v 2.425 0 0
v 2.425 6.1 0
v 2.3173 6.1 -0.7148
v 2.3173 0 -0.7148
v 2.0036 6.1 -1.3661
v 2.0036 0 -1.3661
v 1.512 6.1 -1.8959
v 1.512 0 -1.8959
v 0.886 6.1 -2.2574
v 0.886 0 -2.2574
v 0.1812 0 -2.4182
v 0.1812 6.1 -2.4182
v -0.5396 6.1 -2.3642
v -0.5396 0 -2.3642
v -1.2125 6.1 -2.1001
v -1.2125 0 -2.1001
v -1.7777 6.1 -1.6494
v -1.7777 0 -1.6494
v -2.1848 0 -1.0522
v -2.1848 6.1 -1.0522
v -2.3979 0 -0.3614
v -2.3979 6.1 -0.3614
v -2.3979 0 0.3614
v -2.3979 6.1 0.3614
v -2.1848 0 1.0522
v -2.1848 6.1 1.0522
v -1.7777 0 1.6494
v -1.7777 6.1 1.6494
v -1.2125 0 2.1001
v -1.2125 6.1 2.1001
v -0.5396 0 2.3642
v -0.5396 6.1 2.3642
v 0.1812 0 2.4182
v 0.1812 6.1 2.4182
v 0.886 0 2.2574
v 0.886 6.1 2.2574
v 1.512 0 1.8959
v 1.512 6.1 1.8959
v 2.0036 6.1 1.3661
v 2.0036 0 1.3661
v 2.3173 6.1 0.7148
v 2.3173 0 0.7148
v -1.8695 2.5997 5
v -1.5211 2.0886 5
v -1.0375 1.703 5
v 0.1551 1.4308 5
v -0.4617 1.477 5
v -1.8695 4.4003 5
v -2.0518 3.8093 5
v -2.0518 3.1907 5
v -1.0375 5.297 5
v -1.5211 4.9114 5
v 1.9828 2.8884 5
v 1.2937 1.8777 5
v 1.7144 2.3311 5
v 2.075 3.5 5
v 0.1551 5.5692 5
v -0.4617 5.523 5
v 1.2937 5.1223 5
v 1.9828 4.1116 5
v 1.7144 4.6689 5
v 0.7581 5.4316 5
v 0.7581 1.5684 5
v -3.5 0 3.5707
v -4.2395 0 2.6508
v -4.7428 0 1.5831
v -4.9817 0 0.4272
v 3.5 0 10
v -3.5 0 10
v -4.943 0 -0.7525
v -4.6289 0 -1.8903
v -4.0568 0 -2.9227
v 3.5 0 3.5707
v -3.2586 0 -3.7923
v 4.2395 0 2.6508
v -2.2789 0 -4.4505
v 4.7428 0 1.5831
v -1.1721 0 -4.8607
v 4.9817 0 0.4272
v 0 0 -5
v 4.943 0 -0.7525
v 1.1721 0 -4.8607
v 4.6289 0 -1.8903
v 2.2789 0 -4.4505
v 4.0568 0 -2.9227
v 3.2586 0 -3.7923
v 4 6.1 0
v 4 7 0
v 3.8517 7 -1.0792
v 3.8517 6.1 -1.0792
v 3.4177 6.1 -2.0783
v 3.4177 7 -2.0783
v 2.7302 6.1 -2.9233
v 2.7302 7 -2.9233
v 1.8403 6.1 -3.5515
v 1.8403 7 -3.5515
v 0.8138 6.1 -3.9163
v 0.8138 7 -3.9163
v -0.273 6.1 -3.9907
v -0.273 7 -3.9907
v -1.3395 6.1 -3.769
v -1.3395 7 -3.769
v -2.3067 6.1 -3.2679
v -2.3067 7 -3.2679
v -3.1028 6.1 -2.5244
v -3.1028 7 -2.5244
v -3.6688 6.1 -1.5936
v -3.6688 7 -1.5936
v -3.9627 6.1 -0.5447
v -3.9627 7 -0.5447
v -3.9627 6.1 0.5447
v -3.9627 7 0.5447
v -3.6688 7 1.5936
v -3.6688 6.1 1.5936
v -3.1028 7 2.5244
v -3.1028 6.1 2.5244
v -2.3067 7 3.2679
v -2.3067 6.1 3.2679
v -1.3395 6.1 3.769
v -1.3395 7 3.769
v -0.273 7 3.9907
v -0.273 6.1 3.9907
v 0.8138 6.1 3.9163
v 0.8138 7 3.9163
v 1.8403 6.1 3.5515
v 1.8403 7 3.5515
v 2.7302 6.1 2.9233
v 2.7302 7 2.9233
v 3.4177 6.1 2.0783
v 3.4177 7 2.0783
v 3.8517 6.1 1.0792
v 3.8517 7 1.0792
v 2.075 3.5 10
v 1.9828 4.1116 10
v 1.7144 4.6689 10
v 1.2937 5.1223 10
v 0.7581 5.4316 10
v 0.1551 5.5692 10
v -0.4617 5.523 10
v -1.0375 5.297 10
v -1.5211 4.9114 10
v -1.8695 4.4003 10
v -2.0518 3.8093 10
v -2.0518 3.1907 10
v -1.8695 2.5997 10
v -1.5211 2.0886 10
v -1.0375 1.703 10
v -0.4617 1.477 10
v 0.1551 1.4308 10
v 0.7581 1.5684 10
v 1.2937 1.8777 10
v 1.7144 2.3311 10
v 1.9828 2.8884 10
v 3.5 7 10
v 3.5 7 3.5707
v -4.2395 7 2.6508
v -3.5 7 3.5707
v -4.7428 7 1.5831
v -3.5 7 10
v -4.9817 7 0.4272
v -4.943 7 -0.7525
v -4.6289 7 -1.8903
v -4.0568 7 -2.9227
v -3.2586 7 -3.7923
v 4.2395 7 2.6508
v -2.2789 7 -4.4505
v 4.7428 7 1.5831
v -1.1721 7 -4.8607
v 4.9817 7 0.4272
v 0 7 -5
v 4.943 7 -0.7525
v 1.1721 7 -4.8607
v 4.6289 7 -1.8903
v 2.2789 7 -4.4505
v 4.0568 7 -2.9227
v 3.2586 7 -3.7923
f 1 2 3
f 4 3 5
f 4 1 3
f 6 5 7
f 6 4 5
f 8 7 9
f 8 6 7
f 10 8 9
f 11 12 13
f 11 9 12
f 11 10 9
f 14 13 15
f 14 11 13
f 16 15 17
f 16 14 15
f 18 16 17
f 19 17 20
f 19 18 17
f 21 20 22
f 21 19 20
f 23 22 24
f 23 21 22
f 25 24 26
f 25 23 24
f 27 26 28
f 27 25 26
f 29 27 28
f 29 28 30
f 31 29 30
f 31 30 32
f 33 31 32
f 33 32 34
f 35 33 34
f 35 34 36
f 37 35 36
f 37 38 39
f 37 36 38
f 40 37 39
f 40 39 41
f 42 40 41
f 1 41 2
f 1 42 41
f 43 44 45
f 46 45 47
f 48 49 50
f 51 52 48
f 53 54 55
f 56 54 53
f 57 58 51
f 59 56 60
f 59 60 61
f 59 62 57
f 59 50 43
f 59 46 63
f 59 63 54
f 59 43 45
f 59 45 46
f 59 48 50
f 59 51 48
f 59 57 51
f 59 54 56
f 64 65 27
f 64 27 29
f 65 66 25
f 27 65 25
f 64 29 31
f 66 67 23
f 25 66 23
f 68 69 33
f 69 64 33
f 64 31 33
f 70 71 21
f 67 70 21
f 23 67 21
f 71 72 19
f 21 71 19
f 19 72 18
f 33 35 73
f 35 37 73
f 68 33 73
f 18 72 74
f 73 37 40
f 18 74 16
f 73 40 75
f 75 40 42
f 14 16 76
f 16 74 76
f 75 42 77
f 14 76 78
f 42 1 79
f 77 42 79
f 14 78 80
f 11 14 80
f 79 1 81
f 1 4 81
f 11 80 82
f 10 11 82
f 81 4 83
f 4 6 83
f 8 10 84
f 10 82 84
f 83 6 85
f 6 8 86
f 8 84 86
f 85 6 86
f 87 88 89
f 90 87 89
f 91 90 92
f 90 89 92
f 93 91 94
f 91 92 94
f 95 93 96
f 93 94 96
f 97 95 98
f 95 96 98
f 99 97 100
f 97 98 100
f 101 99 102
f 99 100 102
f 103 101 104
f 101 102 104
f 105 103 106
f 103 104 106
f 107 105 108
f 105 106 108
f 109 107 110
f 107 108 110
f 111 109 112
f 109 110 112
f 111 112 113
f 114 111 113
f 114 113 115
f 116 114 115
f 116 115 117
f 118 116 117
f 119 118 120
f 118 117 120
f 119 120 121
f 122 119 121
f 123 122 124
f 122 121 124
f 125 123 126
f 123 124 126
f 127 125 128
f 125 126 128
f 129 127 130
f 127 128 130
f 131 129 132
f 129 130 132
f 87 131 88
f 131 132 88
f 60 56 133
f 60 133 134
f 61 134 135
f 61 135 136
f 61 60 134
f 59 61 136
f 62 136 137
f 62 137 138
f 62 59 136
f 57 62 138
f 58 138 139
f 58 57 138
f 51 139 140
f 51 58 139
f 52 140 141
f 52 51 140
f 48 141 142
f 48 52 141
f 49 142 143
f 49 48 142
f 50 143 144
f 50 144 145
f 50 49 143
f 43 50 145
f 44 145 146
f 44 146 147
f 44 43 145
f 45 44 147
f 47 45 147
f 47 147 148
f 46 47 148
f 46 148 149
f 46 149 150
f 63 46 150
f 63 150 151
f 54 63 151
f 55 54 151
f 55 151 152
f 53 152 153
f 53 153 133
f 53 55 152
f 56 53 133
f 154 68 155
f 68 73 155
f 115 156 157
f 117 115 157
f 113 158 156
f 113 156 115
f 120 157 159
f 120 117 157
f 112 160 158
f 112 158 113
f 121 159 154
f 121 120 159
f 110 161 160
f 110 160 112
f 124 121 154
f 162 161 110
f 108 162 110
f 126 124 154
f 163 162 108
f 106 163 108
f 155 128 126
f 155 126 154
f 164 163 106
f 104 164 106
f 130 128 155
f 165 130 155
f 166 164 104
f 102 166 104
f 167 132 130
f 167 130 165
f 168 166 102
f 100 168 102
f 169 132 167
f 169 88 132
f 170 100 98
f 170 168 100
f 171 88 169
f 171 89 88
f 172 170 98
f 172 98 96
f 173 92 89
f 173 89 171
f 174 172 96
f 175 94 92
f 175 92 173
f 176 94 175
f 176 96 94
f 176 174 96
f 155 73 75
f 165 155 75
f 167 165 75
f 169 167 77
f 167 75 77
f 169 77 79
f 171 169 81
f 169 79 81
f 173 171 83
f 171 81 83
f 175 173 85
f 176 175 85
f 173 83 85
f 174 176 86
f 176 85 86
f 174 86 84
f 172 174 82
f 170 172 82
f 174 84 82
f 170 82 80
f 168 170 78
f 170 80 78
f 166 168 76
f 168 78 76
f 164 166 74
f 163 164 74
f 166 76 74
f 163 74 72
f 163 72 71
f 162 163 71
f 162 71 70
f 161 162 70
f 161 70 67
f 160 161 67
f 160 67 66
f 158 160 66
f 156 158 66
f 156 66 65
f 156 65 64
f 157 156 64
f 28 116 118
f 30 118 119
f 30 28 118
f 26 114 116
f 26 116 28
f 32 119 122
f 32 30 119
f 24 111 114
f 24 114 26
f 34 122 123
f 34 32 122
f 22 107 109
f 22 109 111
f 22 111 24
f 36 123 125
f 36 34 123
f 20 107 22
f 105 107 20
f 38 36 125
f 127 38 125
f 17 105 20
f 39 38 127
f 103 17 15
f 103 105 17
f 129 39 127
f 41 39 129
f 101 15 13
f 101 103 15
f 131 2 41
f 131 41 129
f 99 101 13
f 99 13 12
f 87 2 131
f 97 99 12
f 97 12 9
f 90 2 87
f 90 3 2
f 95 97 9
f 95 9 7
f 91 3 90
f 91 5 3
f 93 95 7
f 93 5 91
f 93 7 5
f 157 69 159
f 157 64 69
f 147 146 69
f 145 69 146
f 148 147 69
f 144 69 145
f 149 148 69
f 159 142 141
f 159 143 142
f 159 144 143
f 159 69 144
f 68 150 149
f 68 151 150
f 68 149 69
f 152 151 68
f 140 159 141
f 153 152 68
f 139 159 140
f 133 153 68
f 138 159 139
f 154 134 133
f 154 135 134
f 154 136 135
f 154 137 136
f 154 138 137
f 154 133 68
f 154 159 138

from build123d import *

# Parameters (mm, degrees)
SKETCH1_R           = 5
SKETCH1_R_2         = 2.425
BOSS_EXTRUDE1_DEPTH = 7
SKETCH2_W           = 3.5
SKETCH2_H           = 7
BOSS_EXTRUDE3_DEPTH = 1.5
SKETCH4_W           = 7
SKETCH4_H           = 7
SKETCH4_R           = 2.075
BOSS_EXTRUDE4_DEPTH = 5
SKETCH5_R           = 4
CUT_EXTRUDE1_DEPTH  = 0.9


with BuildPart() as part:
    # Sketch1 → Boss-Extrude1 (new body)
    with BuildSketch(Plane(origin=(0, 0, 0), x_dir=(1, 0, 0), z_dir=(0, 1, 0))):
        Circle(SKETCH1_R)
        Circle(SKETCH1_R_2, mode=Mode.SUBTRACT)
    extrude(amount=BOSS_EXTRUDE1_DEPTH)

    # Sketch2 → Boss-Extrude3 (add)
    with BuildSketch(Plane.XY.offset(5)):
        with Locations((-1.75, 3.5)):
            Rectangle(SKETCH2_W, SKETCH2_H)
        with Locations((1.75, 3.5)):
            Rectangle(SKETCH2_W, SKETCH2_H)
    extrude(amount=-BOSS_EXTRUDE3_DEPTH)

    # Sketch4 → Boss-Extrude4 (add)
    with BuildSketch(Plane.XY.offset(5)):
        with Locations((0, 3.5)):
            Rectangle(SKETCH4_W, SKETCH4_H)
        with Locations((0, 3.5)):
            Circle(SKETCH4_R, mode=Mode.SUBTRACT)
    extrude(amount=BOSS_EXTRUDE4_DEPTH)

    # Sketch5 → Cut-Extrude1 (cut)
    with BuildSketch(Plane(origin=(0, 7, 0), x_dir=(1, 0, 0), z_dir=(0, 1, 0))):
        Circle(SKETCH5_R)
    extrude(amount=-CUT_EXTRUDE1_DEPTH, mode=Mode.SUBTRACT)


solid = part.part
